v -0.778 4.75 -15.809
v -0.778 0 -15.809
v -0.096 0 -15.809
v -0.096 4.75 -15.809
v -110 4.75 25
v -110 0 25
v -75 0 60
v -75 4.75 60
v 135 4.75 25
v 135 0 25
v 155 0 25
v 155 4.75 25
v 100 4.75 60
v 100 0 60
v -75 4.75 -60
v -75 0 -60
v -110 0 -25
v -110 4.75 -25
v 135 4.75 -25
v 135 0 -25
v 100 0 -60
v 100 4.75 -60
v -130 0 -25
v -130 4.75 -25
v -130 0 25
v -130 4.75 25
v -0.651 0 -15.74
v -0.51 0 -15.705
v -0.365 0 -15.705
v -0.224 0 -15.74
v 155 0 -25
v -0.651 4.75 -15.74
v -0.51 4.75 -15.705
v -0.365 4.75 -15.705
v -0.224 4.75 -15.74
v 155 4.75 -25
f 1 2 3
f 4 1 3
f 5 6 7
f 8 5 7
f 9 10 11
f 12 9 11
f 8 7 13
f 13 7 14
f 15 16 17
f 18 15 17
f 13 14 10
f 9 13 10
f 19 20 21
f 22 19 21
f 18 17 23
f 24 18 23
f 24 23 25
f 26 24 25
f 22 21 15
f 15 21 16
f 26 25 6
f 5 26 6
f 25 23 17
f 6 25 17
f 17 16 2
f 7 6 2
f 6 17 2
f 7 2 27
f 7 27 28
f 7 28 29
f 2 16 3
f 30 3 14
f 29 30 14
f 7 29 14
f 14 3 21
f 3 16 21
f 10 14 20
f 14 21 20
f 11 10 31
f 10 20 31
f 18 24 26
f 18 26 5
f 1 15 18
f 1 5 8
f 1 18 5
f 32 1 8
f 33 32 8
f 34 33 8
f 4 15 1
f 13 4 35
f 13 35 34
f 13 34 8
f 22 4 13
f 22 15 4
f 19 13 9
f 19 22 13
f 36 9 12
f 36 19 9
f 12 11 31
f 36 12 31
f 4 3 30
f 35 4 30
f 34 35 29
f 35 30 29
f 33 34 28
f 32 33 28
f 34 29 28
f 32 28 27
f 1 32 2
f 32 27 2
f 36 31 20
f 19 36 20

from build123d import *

# Parameters (mm, degrees)
BOSS_EXTRUDE2_DEPTH = 4.75


with BuildPart() as part:
    # Sketch1 → Boss-Extrude2 (new body)
    with BuildSketch(Plane(origin=(0, 0, 0), x_dir=(1, 0, 0), z_dir=(0, 1, 0))):
        Polygon((100, 60), (-75, 60), (-110, 25), (-130, 25), (-130, -25), (-110, -25), (-75, -60), (100, -60), (135, -25), (155, -25), (155, 25), (135, 25), align=None)
        with BuildLine():
            ThreePointArc((-0.096105451, 15.808688779), (-0.437294407, 15.700808335), (-0.778483364, 15.808688779))
            Line((-0.778483364, 15.808688779), (-0.096105451, 15.808688779))
        make_face(mode=Mode.SUBTRACT)
    extrude(amount=BOSS_EXTRUDE2_DEPTH)


solid = part.part
